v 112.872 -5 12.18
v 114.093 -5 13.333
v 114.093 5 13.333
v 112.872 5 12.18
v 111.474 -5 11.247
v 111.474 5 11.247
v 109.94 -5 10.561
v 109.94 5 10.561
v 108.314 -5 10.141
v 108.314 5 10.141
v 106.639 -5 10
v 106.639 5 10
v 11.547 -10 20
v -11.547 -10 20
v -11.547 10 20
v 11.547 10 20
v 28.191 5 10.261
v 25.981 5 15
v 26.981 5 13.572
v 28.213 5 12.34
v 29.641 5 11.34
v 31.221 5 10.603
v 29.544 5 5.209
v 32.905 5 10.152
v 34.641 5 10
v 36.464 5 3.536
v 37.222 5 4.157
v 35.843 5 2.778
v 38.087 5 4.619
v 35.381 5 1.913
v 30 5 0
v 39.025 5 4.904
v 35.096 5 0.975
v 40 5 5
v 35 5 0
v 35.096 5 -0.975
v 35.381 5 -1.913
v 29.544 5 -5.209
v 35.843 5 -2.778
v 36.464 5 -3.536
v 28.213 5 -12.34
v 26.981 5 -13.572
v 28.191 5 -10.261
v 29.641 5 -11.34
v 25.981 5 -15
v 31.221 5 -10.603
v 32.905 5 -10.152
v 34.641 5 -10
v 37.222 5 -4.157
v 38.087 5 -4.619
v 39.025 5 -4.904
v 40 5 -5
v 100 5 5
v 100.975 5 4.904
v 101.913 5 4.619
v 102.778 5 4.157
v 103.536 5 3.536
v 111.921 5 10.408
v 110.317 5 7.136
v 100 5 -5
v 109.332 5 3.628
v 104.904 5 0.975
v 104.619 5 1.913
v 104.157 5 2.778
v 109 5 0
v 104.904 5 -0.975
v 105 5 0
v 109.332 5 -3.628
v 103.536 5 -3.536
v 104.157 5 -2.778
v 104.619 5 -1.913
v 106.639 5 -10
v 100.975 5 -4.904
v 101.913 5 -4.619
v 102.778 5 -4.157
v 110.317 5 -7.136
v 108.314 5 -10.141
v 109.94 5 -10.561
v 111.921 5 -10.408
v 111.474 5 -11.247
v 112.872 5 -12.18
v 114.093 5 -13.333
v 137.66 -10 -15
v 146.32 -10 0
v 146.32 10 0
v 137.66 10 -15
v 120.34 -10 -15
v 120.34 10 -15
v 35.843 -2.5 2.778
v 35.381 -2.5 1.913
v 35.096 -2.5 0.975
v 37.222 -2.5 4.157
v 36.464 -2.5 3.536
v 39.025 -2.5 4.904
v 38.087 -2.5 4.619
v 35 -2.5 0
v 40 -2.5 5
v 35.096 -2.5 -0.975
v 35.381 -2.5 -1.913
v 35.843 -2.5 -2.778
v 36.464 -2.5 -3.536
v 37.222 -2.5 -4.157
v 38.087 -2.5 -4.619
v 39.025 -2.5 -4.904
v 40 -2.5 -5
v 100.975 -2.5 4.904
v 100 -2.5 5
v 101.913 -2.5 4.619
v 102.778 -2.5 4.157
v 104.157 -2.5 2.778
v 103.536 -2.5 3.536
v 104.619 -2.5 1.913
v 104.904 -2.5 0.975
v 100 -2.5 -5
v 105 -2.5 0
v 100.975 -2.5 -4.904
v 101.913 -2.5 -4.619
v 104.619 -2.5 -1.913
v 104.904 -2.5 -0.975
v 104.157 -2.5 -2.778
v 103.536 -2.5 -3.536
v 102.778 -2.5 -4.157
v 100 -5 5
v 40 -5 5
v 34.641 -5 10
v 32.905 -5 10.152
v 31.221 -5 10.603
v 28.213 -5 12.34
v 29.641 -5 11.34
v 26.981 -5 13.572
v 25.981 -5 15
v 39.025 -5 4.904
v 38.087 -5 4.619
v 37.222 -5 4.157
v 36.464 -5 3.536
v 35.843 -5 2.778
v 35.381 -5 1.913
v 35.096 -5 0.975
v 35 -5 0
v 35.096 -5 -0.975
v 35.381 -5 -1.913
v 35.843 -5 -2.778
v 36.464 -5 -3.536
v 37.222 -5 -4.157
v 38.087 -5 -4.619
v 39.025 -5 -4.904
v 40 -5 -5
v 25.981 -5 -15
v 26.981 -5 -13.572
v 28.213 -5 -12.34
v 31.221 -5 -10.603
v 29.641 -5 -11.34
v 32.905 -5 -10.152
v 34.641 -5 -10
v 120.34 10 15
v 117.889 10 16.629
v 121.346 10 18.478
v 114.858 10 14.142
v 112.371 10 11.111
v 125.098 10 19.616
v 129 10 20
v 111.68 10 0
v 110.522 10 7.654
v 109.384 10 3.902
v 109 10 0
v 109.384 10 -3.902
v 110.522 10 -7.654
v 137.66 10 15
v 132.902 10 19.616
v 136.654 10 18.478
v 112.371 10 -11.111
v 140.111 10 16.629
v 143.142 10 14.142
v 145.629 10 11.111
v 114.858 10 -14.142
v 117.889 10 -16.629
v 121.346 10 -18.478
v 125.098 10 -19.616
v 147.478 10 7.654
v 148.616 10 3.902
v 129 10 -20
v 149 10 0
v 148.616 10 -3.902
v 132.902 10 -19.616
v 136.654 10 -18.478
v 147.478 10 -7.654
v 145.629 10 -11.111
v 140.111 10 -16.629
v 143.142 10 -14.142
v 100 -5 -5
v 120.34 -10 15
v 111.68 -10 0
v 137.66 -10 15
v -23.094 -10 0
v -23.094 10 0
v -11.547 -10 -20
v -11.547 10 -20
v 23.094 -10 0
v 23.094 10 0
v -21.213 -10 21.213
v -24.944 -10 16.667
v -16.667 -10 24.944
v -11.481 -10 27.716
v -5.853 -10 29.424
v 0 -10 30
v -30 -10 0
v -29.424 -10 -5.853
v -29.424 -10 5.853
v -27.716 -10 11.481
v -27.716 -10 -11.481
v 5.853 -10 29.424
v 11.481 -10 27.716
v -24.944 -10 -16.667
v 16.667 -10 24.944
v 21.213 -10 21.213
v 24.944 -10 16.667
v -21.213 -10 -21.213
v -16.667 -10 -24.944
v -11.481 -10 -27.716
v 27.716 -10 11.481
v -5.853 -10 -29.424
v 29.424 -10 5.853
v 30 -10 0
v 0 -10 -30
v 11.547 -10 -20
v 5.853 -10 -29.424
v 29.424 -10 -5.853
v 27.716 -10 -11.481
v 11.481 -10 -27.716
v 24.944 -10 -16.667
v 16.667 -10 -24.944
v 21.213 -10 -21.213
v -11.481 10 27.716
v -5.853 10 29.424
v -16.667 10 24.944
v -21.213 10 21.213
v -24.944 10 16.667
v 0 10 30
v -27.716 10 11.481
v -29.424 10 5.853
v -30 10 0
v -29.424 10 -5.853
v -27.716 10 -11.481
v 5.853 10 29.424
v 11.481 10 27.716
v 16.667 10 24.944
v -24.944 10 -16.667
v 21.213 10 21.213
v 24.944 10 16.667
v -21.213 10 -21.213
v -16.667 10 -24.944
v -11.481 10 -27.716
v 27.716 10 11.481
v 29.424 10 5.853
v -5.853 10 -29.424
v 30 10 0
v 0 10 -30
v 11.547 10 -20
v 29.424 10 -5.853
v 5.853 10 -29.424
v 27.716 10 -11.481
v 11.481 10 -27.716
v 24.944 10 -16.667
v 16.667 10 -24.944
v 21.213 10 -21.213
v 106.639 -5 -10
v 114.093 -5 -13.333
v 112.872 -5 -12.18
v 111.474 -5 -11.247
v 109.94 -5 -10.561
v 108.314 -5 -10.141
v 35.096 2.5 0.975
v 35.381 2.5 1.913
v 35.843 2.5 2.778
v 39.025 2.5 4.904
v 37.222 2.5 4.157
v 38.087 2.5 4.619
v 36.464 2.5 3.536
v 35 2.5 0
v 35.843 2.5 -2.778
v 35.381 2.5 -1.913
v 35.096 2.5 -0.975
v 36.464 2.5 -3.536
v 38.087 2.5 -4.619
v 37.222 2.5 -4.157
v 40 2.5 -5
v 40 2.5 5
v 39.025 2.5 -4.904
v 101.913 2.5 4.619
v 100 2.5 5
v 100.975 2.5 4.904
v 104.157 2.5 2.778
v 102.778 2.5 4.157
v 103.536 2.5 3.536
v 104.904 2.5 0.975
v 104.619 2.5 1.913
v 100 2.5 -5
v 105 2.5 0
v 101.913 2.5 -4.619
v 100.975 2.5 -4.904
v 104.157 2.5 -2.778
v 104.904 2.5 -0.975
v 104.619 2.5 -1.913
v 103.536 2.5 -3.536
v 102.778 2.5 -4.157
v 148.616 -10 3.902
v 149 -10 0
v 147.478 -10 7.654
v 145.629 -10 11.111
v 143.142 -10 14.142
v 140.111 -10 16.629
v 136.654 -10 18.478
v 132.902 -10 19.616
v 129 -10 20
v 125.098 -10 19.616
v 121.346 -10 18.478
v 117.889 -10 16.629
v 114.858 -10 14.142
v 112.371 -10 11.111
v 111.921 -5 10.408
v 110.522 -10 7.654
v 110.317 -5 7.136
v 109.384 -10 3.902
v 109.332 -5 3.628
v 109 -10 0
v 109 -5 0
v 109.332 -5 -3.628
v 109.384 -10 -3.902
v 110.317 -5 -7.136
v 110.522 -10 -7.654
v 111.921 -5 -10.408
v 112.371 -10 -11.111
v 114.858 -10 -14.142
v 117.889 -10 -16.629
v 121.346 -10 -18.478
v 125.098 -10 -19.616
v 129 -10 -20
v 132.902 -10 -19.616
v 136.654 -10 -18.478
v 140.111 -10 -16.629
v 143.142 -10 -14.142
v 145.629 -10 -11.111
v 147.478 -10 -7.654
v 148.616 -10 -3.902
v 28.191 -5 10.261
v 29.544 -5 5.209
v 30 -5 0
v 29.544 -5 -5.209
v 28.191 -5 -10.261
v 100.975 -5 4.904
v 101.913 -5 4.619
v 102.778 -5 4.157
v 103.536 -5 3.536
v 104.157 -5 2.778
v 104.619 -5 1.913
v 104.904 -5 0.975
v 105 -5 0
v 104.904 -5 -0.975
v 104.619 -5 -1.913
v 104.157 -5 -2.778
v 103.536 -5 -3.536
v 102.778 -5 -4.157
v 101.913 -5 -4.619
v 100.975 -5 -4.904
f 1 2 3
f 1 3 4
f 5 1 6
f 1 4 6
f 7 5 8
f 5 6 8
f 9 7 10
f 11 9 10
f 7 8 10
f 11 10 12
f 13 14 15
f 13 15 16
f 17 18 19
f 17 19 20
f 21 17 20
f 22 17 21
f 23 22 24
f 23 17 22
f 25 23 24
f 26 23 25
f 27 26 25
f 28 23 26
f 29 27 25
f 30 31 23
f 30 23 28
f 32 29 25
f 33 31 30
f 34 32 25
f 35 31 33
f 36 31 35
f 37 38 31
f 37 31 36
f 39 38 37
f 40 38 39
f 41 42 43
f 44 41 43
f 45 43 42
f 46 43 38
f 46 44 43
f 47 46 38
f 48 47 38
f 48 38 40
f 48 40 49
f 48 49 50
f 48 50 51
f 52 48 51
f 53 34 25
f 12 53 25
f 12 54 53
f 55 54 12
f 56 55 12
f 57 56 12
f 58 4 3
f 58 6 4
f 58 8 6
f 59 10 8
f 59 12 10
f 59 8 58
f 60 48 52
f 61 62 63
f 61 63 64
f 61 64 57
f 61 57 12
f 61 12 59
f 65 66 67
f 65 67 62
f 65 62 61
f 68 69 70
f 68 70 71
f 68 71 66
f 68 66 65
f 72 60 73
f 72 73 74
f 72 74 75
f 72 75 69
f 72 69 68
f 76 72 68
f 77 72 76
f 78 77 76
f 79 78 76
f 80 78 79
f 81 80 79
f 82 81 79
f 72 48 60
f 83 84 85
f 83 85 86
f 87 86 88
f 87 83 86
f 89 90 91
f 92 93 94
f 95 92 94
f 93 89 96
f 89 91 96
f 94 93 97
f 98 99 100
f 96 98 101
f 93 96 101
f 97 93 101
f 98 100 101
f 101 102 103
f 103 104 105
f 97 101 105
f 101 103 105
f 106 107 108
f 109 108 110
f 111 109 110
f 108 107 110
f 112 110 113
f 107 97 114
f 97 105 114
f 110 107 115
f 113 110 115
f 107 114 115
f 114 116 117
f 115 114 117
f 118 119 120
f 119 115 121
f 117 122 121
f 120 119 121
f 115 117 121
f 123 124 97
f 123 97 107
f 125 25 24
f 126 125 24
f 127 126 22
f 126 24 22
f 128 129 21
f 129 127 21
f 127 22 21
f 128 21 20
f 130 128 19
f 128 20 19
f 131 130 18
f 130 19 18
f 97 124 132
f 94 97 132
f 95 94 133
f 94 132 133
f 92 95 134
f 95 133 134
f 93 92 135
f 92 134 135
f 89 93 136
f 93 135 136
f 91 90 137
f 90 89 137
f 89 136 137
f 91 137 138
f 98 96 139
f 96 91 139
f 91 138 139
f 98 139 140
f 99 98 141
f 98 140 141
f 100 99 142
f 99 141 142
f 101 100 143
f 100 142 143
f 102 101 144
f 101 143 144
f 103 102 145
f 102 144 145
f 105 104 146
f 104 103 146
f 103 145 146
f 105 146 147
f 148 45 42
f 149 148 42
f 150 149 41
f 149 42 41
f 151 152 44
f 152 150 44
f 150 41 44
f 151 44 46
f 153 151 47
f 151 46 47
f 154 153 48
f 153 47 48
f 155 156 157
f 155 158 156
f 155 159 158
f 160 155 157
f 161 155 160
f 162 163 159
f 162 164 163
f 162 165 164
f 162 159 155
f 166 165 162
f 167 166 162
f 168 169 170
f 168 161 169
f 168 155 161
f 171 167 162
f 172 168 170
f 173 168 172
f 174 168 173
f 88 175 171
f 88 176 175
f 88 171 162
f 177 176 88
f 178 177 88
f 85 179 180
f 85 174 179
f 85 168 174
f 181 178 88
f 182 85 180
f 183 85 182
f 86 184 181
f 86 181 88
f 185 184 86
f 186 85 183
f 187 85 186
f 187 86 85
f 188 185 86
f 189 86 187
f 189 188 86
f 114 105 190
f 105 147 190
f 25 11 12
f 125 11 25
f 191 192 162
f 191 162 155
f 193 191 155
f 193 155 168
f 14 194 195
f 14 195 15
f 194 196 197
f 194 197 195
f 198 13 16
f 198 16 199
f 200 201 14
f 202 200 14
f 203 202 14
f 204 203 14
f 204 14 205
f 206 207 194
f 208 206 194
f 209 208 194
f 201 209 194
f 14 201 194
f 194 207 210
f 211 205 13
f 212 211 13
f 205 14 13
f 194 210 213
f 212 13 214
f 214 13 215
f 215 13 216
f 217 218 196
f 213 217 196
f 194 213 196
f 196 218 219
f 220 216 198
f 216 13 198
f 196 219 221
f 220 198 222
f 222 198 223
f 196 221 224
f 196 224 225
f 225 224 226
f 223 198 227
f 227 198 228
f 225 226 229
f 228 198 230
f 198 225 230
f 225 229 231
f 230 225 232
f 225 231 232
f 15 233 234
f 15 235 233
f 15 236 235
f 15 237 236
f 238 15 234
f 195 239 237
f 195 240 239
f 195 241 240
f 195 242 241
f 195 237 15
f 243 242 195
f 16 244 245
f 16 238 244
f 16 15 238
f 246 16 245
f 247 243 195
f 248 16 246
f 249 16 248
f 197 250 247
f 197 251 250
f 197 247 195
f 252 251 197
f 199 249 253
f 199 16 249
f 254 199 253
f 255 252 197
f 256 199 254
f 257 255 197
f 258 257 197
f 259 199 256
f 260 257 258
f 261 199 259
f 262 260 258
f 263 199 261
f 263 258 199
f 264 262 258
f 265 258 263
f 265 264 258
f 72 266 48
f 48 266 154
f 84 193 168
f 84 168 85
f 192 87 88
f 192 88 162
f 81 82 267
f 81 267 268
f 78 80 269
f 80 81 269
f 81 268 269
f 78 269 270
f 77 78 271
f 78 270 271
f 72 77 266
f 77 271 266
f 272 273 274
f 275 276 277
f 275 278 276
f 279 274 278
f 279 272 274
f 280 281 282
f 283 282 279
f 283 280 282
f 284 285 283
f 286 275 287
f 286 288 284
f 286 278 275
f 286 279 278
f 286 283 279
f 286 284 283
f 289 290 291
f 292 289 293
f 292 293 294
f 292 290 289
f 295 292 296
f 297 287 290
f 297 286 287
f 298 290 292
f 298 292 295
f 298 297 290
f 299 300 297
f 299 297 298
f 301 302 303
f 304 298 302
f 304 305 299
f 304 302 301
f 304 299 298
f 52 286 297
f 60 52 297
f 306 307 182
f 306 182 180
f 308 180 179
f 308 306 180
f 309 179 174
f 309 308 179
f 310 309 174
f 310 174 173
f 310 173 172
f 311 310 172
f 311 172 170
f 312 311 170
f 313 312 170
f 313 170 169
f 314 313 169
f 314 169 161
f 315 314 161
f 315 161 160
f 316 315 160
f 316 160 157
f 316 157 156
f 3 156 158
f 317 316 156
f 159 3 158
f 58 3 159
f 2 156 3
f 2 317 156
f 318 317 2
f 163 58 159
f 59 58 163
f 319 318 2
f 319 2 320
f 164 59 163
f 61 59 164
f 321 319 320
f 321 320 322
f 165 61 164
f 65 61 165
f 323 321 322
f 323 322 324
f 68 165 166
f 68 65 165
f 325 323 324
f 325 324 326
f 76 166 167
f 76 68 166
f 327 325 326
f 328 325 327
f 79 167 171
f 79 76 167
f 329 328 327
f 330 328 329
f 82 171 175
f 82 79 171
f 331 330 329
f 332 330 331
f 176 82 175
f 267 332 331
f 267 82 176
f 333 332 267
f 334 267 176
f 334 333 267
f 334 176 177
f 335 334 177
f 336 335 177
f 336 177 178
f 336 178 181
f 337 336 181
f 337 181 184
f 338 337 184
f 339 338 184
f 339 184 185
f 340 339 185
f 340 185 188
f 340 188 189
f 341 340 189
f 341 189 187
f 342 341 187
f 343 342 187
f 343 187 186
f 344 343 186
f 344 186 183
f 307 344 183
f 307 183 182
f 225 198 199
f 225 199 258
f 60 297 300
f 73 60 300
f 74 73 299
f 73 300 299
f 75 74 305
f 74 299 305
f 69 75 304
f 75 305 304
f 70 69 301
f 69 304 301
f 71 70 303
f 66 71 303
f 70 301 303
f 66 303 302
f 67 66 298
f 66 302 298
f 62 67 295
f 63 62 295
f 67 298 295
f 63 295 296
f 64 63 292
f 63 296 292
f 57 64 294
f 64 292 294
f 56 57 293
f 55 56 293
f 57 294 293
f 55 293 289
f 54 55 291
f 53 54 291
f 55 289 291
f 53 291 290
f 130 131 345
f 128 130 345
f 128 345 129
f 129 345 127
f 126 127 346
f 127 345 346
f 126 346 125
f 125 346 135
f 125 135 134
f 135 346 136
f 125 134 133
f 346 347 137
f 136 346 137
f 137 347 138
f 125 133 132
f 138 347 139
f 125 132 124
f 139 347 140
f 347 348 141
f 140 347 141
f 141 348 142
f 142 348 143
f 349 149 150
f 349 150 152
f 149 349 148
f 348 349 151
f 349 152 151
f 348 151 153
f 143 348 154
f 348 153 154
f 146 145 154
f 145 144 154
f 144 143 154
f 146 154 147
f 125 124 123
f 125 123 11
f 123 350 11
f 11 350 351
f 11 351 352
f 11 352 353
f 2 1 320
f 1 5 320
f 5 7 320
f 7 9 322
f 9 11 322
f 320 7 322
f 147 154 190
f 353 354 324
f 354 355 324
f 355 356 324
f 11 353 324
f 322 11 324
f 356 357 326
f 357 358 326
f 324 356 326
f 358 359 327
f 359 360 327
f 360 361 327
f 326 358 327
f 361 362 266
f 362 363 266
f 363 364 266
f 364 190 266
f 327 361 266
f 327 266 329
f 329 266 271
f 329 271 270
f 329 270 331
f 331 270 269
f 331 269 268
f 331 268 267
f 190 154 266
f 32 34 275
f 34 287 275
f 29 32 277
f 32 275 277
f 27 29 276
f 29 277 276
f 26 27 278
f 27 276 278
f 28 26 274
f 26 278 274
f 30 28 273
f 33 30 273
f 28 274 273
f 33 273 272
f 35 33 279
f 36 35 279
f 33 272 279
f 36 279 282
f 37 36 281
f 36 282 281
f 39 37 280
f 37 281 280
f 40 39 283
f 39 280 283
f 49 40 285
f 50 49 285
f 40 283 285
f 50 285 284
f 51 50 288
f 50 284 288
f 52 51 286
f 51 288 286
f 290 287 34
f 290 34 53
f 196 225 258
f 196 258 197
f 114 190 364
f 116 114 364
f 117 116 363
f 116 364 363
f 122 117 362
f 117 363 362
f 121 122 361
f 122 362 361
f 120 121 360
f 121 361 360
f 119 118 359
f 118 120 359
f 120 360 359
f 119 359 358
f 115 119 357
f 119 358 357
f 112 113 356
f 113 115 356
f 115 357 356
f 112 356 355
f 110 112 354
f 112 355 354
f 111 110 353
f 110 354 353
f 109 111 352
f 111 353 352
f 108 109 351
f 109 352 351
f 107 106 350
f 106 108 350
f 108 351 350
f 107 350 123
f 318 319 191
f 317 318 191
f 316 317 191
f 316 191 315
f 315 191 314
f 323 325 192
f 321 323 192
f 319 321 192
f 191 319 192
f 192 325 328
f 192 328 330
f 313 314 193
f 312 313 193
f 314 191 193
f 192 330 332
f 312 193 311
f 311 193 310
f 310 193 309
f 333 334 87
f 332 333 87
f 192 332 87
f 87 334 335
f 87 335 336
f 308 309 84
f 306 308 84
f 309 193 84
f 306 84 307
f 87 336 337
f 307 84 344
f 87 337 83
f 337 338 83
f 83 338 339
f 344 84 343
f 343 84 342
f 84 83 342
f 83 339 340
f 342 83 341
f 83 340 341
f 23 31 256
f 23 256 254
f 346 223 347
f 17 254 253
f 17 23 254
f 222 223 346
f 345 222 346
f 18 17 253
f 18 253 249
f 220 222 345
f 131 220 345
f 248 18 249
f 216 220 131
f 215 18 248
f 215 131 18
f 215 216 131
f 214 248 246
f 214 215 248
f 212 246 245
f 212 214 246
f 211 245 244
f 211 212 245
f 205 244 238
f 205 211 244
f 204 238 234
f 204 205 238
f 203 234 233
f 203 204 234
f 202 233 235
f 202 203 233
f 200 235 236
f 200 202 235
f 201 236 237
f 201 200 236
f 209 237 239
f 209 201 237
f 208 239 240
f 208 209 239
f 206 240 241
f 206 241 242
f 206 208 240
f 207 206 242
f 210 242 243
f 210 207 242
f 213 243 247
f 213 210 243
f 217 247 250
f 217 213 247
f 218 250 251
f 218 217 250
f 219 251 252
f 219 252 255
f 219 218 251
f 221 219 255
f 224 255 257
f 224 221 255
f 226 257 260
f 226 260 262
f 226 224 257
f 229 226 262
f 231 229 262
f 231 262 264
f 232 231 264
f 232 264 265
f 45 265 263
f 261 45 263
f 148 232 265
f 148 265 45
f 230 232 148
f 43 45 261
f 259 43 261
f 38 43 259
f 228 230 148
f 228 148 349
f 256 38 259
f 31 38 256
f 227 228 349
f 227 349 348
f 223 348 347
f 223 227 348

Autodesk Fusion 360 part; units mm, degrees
sketch "Sketch1" plane through (0, 0, 0) normal (0, 1, 0) x (1, 0, 0)
  line L0 (0, 0) -> (129, 0)
  line L1 (11.547, -20) -> (23.094, 0)
  line L2 (23.094, 0) -> (11.547, 20)
  line L3 (11.547, 20) -> (-11.547, 20)
  line L4 (-11.547, 20) -> (-23.094, 0)
  line L5 (-23.094, 0) -> (-11.547, -20)
  line L6 (-11.547, -20) -> (11.547, -20)
  circle A0 centre (0, 0) radius 30
  circle A1 centre (129, 0) radius 20
  line L7 (129, 0) -> (129, -15)
  line L8 (137.6603, -15) -> (146.3205, 0)
  line L9 (146.3205, 0) -> (137.6603, 15)
  line L10 (137.6603, 15) -> (120.3397, 15)
  line L11 (120.3397, 15) -> (111.6795, 0)
  line L12 (111.6795, 0) -> (120.3397, -15)
  line L13 (120.3397, -15) -> (137.6603, -15)
  line L14 (45, 10) -> (111.6795, 10)
  line L15 (45, 10) -> (28.2843, 10)
  line L16 (45, -10) -> (28.2843, -10)
  line L17 (45, -10) -> (111.6795, -10)
  line L18 (40, -5) -> (109.6351, -5)
  line L19 (40, -5) -> (29.5804, -5)
  line L20 (40, 5) -> (109.6351, 5)
  line L21 (40, 5) -> (29.5804, 5)
  circle A2 centre (40, 0) radius 5
  circle A3 centre (100, 0) radius 5
  point P0 (129, 0)
  dimension "d1" = 129
  dimension "d3" = 60
  dimension "d4" = 40
  dimension "d5" = 15
  dimension "d9" = 20
  dimension "d10" = 10
  dimension "d11" = 10
extrude "Extrude1" add sketch "Sketch1" along normal mid plane 10 contours L0 A0 L21 A2 | L0 A0 L19 A2 | A0 A1 L14 L15 L20 L21 | A0 A1 L16 L17 L18 L19 | L0 A1 L20 A3 | L0 A1 L18 A3
extrude "Extrude2" add sketch "Sketch1" along normal mid plane 5 contours L0 A2 | L0 A2 | L0 L20 A2 A3 | L0 L18 A2 A3 | L0 A3 | L0 A3
extrude "Extrude3" add sketch "Sketch1" along normal mid plane 20 contours A0 | A1
fillet "Fillet1" radius 10 4 edges at (28.2843, 0, 10) (111.6795, 0, 10) (28.2843, 0, -10) (111.6795, 0, -10)
